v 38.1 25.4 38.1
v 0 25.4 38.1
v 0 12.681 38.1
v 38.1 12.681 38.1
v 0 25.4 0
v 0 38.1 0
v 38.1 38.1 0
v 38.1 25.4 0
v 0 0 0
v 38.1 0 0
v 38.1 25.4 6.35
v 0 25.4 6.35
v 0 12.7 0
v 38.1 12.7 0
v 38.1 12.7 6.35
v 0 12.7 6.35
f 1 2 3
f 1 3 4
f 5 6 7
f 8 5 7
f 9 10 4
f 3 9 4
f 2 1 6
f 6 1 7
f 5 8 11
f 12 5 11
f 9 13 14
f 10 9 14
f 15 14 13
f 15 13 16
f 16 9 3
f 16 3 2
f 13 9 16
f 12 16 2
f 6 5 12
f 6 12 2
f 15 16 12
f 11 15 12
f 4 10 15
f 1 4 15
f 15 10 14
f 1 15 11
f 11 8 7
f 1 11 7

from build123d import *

# Parameters (mm, degrees)
F0_W     = 38.1
F0_H     = 38.1
F1_DEPTH = 38.1
F3_DEPTH = 38.1
F2_W     = 12.7
F2_H     = 6.35
F4_DEPTH = 38.1


with BuildPart() as f1:
    # F0 (on Top) → F1 (new body)
    with BuildSketch(Plane.XY):
        with Locations((19.05, 19.05)):
            Rectangle(F0_W, F0_H)
    extrude(amount=F1_DEPTH)

    # F2 (on face) → F3 (cut)
    with BuildSketch(Plane.YZ.offset(38.1)):
        Polygon((0, 38.1), (0, 0), (12.681324, 38.1), align=None)
    extrude(amount=-F3_DEPTH, mode=Mode.SUBTRACT)

    # F2 (on face) → F4 (cut)
    with BuildSketch(Plane.YZ.offset(38.1)):
        Polygon((25.4, 38.1), (38.1, 0), (38.1, 38.1), align=None)
        with Locations((19.05, 3.175)):
            Rectangle(F2_W, F2_H)
        Polygon((0, 38.1), (0, 0), (12.681324, 38.1), align=None)
    extrude(amount=-F4_DEPTH, mode=Mode.SUBTRACT)


solid = f1.part
